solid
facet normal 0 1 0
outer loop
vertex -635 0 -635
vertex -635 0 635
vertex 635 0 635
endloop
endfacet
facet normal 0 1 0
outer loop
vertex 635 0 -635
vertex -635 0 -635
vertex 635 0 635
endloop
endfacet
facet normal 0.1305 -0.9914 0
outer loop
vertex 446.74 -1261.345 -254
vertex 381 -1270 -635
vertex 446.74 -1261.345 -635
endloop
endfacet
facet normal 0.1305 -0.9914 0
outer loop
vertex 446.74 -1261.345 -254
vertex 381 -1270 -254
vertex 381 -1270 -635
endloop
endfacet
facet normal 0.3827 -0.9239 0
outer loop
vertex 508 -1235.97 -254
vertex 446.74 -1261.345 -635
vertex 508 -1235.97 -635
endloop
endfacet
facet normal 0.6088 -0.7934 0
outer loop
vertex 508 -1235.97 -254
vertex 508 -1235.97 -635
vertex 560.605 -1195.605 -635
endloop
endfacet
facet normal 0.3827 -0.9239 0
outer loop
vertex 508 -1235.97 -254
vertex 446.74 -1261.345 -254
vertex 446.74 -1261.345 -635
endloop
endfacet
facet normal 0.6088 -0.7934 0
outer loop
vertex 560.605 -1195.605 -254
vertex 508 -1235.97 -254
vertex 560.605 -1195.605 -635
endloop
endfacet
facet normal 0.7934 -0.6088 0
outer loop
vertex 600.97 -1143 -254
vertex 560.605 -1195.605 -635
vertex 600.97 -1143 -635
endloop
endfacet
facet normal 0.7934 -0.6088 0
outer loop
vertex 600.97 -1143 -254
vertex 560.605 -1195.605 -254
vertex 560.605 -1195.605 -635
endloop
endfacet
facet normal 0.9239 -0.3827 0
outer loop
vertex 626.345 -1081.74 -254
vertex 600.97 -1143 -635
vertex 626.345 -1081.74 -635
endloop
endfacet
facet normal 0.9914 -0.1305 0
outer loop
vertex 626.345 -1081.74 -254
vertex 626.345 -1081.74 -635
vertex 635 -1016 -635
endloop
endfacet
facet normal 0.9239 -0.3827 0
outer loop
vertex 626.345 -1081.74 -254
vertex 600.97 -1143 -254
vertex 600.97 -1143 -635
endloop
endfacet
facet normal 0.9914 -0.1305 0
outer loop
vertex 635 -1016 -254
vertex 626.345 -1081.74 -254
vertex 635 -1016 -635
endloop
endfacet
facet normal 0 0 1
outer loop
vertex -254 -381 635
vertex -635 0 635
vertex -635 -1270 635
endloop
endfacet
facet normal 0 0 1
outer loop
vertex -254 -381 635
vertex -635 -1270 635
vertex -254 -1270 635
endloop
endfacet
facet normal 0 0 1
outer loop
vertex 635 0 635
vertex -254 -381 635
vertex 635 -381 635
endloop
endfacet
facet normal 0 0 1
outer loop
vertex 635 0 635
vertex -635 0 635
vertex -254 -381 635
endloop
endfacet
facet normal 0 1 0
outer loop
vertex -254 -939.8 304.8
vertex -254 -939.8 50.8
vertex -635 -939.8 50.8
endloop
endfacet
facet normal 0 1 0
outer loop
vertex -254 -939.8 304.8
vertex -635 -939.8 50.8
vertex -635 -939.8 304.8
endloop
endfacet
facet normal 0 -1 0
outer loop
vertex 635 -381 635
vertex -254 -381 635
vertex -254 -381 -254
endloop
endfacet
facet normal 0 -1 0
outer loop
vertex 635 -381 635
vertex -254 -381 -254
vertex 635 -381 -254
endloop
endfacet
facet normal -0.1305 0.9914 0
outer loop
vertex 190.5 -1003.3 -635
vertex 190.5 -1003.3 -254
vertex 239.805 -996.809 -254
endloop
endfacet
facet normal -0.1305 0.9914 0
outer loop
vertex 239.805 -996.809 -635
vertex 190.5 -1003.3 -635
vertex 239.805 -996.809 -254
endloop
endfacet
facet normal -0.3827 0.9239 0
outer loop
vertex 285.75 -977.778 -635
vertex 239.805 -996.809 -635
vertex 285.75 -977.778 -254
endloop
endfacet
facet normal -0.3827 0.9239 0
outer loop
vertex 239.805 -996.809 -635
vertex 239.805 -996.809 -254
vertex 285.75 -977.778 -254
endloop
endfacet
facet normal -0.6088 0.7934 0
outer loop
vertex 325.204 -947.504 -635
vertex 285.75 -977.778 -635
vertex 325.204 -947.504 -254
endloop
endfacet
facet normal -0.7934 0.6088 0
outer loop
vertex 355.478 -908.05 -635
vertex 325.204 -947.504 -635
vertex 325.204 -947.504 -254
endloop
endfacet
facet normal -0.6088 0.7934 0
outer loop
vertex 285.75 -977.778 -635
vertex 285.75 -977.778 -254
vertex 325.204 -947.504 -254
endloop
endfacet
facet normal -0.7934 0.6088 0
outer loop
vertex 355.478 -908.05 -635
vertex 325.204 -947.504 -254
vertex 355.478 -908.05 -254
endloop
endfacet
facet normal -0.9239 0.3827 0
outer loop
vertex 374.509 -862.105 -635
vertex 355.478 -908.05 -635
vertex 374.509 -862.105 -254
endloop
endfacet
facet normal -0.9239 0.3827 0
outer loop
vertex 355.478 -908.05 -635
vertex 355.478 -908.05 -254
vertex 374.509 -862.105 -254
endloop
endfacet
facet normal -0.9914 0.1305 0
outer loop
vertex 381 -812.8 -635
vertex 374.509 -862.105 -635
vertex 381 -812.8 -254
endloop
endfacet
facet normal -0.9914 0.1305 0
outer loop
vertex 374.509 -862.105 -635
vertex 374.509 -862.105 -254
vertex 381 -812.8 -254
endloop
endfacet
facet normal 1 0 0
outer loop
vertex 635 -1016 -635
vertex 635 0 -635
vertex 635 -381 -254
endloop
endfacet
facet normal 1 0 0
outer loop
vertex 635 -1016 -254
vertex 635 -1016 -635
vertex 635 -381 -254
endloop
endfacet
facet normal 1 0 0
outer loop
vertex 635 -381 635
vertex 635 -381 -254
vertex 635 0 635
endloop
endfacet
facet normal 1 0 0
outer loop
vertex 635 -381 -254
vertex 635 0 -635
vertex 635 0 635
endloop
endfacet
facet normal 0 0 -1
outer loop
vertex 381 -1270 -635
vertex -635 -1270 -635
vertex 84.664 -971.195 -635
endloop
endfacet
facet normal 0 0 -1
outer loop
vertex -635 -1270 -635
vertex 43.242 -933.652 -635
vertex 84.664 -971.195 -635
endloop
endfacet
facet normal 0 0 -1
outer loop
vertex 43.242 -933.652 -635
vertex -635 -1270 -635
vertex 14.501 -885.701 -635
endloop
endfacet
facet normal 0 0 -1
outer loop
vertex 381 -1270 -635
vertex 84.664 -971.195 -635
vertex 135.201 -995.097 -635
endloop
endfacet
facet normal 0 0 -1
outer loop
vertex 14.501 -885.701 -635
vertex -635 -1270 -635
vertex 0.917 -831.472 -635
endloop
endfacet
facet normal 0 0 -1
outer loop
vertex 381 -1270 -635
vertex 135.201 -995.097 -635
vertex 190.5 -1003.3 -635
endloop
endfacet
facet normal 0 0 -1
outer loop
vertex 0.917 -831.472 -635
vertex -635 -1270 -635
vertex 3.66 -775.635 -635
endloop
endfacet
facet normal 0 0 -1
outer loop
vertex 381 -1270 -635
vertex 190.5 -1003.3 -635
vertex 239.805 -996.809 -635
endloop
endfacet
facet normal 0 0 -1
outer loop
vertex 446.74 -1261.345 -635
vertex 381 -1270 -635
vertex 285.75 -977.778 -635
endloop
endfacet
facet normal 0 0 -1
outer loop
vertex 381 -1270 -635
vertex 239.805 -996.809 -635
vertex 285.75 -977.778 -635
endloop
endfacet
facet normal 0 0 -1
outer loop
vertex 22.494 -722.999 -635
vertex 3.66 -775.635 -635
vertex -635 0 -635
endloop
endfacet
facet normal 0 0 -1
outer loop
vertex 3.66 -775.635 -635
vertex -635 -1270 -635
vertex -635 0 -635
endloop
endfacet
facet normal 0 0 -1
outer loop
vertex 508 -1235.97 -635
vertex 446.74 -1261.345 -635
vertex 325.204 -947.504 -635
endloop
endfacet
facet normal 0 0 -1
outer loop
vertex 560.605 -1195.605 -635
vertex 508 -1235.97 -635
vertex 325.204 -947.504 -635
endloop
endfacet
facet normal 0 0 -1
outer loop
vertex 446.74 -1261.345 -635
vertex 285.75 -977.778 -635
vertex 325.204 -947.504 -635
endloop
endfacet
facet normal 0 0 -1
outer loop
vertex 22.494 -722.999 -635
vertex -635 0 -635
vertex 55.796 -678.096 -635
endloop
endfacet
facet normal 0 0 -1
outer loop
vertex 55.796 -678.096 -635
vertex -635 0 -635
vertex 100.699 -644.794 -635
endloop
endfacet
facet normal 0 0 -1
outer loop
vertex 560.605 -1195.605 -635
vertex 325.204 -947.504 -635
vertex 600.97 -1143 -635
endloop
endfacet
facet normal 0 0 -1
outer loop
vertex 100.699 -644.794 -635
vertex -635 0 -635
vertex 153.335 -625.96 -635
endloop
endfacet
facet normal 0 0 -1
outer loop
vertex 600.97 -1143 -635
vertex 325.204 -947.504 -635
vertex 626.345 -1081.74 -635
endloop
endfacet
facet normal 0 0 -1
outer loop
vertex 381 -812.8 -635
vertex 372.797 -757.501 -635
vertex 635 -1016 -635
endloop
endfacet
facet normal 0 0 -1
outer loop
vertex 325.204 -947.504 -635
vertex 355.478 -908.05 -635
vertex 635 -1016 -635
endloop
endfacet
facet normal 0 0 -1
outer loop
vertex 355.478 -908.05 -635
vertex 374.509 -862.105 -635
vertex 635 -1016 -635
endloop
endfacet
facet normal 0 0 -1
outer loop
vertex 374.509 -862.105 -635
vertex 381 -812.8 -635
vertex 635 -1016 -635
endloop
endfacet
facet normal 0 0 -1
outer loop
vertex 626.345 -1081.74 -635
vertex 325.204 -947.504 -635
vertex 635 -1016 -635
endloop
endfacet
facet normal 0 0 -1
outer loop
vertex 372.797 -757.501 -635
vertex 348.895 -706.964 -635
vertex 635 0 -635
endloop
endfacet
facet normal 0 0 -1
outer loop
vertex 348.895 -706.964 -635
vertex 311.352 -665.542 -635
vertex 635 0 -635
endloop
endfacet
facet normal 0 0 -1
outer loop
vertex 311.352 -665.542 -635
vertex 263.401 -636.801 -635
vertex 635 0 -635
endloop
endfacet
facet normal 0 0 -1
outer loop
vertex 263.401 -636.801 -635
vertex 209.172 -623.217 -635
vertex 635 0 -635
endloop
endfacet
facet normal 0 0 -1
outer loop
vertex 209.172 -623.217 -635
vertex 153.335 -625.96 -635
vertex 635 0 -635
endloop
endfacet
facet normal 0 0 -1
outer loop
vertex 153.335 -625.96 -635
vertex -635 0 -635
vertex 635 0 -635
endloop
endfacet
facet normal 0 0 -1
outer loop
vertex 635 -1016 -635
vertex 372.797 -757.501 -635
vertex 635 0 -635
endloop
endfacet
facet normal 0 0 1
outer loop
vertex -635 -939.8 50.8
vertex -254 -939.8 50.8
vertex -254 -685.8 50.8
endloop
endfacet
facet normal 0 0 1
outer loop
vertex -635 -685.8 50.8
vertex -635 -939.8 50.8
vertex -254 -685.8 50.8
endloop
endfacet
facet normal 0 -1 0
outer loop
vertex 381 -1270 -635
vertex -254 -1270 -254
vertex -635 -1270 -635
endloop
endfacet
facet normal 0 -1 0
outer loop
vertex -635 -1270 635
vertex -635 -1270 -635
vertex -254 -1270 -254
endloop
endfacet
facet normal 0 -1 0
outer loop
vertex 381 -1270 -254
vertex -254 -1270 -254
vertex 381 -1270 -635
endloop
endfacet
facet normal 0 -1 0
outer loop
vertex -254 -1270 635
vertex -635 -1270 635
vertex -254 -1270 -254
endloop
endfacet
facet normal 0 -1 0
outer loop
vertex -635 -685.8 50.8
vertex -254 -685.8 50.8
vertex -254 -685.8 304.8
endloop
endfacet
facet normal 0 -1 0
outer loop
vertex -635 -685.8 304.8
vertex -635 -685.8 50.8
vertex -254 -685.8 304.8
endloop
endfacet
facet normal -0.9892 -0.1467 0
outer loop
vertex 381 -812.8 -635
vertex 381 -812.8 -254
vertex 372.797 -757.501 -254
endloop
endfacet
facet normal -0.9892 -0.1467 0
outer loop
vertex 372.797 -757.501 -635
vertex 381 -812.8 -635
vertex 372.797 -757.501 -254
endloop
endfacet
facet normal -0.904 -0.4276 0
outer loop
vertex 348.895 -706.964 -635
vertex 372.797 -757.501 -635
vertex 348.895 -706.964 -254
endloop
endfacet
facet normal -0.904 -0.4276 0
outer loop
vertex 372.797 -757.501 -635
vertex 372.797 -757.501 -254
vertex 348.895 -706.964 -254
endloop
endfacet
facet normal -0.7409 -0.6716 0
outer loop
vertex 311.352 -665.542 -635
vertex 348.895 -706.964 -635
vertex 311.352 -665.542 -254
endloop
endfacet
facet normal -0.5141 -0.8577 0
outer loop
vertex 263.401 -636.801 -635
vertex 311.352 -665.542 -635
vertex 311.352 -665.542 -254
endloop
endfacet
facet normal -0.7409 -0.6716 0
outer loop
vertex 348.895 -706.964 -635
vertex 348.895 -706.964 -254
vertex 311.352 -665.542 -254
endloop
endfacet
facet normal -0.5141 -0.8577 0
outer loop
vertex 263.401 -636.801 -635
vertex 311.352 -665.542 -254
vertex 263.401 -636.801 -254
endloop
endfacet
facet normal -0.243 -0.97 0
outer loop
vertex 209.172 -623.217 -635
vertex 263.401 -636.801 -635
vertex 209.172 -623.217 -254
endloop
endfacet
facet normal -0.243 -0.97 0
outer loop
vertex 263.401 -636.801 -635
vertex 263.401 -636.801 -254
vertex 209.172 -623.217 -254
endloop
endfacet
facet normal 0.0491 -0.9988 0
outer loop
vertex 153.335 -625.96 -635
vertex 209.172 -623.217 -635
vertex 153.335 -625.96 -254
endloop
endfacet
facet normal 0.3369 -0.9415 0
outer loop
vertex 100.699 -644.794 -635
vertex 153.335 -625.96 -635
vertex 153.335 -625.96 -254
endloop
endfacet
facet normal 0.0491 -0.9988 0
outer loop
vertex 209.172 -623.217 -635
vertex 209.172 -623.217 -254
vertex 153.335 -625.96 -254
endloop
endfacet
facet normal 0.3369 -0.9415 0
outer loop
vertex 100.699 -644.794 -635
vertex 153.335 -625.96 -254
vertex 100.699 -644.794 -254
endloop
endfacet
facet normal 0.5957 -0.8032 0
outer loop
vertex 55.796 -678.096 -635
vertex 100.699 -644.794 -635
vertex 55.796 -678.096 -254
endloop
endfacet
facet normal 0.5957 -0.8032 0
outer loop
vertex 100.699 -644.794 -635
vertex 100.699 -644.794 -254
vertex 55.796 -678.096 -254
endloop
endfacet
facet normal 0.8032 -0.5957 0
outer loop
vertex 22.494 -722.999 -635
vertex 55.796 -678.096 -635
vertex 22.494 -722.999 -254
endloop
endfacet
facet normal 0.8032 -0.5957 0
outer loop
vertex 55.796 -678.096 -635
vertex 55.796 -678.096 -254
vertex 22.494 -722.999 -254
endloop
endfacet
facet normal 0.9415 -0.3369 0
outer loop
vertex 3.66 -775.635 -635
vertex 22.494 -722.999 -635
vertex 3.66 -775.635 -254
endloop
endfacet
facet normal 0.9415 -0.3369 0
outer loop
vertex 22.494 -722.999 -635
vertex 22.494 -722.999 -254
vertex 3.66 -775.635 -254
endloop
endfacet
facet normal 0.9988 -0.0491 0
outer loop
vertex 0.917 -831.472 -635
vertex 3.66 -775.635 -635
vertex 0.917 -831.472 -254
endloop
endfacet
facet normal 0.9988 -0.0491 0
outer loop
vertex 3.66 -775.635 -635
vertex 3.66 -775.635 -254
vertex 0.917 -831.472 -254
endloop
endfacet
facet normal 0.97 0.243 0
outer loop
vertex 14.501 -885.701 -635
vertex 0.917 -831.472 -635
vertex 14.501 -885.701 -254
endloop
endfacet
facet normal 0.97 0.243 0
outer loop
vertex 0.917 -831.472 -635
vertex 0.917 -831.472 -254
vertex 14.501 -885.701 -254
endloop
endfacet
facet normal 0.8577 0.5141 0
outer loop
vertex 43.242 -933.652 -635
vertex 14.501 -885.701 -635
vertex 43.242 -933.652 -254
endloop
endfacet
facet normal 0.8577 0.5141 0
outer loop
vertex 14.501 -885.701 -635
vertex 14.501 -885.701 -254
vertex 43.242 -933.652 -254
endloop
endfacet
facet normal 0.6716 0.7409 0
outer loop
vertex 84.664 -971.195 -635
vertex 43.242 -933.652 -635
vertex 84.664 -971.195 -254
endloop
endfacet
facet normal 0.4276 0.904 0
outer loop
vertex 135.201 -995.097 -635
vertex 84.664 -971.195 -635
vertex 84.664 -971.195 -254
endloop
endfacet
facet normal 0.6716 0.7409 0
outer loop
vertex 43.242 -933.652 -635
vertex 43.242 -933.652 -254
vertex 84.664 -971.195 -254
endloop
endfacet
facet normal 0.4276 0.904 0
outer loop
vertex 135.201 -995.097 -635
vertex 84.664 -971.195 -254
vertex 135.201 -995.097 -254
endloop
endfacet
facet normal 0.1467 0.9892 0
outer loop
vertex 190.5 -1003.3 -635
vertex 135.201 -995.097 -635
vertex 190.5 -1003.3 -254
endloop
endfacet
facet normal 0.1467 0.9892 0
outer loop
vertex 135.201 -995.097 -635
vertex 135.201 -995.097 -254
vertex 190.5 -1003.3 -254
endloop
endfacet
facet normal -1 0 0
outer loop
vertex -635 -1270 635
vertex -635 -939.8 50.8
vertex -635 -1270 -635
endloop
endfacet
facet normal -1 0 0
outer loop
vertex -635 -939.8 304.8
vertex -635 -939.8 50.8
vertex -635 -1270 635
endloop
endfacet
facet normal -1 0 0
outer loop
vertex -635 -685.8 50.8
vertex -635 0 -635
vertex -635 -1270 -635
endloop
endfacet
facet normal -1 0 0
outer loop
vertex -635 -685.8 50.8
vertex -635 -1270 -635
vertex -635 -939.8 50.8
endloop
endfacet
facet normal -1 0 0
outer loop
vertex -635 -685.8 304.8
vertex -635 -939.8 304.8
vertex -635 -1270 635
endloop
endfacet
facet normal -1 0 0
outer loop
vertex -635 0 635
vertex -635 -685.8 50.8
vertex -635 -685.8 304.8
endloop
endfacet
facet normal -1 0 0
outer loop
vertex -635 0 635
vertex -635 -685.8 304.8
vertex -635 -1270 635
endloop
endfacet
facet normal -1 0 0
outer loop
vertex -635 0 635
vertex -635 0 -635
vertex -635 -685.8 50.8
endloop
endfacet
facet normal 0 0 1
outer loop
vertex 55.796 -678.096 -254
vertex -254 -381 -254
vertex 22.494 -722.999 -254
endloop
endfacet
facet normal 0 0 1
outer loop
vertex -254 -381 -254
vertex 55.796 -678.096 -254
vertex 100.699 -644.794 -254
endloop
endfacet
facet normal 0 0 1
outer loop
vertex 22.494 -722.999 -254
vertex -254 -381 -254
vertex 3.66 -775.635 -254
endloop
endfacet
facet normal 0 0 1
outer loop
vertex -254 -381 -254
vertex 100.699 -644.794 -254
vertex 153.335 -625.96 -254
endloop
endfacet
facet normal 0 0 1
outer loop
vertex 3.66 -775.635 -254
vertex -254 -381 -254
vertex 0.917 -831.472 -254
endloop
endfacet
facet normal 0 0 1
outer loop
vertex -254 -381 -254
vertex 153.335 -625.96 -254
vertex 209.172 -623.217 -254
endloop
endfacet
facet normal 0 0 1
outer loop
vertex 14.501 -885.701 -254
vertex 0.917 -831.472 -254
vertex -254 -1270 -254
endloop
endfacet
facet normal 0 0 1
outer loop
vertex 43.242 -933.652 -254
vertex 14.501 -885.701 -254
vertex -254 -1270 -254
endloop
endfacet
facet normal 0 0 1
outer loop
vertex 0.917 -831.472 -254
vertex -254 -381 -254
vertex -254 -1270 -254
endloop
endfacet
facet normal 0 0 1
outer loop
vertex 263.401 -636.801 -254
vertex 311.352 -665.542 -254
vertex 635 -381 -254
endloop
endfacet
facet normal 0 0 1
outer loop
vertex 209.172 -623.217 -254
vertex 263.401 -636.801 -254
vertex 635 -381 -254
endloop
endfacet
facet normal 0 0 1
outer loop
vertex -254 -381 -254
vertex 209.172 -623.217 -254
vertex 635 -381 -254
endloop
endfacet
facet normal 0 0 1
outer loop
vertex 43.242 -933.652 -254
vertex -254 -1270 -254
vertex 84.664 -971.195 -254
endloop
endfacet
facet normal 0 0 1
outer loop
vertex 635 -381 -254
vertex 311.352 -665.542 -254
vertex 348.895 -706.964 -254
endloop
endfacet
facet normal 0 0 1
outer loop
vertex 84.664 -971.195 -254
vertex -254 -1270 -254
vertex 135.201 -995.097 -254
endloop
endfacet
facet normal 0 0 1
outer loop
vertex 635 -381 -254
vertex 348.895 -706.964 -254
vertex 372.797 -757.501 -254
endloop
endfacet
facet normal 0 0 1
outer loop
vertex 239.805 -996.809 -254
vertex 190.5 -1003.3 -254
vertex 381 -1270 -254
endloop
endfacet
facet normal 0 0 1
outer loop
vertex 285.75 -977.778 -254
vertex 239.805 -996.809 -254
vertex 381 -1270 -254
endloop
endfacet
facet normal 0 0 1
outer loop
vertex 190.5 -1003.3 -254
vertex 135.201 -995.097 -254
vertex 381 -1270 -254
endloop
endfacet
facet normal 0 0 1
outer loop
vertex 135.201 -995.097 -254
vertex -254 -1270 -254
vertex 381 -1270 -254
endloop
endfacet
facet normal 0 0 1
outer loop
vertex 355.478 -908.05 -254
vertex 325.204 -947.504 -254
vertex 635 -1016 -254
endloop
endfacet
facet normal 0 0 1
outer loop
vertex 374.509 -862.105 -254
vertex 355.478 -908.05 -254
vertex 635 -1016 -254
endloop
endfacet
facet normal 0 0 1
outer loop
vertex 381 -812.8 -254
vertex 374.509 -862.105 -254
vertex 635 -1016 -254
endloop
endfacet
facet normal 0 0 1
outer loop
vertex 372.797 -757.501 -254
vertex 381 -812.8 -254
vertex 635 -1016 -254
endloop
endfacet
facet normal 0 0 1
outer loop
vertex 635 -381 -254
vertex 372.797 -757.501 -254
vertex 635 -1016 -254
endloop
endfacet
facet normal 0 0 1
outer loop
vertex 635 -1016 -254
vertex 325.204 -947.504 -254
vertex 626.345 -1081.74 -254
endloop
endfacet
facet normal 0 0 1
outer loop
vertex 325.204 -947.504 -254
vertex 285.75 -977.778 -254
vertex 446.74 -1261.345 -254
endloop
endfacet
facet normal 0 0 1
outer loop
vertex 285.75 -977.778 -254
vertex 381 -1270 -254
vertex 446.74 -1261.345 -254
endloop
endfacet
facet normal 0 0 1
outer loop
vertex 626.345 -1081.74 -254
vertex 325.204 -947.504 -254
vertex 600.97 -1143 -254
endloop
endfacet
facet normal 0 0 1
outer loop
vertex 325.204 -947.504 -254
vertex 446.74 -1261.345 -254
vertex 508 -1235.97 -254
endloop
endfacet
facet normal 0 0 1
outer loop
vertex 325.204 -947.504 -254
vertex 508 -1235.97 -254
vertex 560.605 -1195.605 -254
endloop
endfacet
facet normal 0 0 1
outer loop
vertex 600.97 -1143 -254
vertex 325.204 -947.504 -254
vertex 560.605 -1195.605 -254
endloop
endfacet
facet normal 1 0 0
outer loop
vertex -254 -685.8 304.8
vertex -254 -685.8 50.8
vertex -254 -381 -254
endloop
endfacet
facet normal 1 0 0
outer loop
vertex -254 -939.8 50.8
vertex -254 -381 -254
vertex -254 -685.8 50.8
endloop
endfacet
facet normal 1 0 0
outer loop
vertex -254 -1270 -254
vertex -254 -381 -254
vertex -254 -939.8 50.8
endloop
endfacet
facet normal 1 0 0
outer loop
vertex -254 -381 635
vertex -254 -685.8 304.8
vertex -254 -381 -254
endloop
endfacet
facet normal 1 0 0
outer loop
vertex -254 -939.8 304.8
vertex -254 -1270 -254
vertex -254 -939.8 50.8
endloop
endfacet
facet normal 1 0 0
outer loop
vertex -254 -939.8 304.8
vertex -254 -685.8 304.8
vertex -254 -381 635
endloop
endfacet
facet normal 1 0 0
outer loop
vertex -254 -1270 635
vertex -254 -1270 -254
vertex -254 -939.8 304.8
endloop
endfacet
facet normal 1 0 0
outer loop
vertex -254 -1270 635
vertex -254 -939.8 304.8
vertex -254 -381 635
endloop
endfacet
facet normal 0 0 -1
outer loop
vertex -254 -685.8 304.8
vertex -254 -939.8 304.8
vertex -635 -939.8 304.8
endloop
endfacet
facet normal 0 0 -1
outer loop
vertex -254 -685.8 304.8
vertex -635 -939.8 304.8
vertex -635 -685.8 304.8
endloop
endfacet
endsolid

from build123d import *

# Parameters (mm, degrees)
F0_W      = 1270
F0_H      = 1270
F1_DEPTH  = 1270
F2_W      = 889
F2_H      = 889
F3_DEPTH  = 889
F4_W      = 254
F4_H      = 254
F5_DEPTH  = 381
F5_FACE_W = 254
F5_FACE_H = 254
F6_DEPTH  = 762
F8_DEPTH  = 381
F9_R      = 254


with BuildPart() as f1:
    # F0 (on Front) → F1 (new body)
    with BuildSketch(Plane.XZ):
        Rectangle(F0_W, F0_H)
    extrude(amount=F1_DEPTH)

    # F2 (on face) → F3 (cut)
    with BuildSketch(Plane.XZ.offset(1270)):
        with Locations((190.5, 190.5)):
            Rectangle(F2_W, F2_H)
    extrude(amount=-F3_DEPTH, mode=Mode.SUBTRACT)

    # F4 (on face) → F5 (join)
    with BuildSketch(Plane.YZ.offset(-254)):
        with Locations((-812.8, 177.8)):
            Rectangle(F4_W, F4_H)
    extrude(amount=F5_DEPTH)

    # F5_face (on face) → F6 (cut)
    with BuildSketch(Plane(origin=(127, -812.8, 177.8), x_dir=(0, 1, 0), z_dir=(1, 0, 0))):
        Rectangle(F5_FACE_W, F5_FACE_H)
    extrude(amount=-F6_DEPTH, mode=Mode.SUBTRACT)

    # F7 (on face) → F8 (cut)
    with BuildSketch(Plane.XY.offset(-254)):
        with BuildLine():
            ThreePointArc((381, -812.8), (55.796158, -678.096158), (190.5, -1003.3))
            ThreePointArc((190.5, -1003.3), (325.203842, -947.503842), (381, -812.8))
        make_face()
    extrude(amount=-F8_DEPTH, mode=Mode.SUBTRACT)

    # F9
    f9_edges = [f1.edges().sort_by_distance(p)[0] for p in [
        (635, -1270, -444.5),
    ]]
    fillet(f9_edges, radius=F9_R)


solid = f1.part
